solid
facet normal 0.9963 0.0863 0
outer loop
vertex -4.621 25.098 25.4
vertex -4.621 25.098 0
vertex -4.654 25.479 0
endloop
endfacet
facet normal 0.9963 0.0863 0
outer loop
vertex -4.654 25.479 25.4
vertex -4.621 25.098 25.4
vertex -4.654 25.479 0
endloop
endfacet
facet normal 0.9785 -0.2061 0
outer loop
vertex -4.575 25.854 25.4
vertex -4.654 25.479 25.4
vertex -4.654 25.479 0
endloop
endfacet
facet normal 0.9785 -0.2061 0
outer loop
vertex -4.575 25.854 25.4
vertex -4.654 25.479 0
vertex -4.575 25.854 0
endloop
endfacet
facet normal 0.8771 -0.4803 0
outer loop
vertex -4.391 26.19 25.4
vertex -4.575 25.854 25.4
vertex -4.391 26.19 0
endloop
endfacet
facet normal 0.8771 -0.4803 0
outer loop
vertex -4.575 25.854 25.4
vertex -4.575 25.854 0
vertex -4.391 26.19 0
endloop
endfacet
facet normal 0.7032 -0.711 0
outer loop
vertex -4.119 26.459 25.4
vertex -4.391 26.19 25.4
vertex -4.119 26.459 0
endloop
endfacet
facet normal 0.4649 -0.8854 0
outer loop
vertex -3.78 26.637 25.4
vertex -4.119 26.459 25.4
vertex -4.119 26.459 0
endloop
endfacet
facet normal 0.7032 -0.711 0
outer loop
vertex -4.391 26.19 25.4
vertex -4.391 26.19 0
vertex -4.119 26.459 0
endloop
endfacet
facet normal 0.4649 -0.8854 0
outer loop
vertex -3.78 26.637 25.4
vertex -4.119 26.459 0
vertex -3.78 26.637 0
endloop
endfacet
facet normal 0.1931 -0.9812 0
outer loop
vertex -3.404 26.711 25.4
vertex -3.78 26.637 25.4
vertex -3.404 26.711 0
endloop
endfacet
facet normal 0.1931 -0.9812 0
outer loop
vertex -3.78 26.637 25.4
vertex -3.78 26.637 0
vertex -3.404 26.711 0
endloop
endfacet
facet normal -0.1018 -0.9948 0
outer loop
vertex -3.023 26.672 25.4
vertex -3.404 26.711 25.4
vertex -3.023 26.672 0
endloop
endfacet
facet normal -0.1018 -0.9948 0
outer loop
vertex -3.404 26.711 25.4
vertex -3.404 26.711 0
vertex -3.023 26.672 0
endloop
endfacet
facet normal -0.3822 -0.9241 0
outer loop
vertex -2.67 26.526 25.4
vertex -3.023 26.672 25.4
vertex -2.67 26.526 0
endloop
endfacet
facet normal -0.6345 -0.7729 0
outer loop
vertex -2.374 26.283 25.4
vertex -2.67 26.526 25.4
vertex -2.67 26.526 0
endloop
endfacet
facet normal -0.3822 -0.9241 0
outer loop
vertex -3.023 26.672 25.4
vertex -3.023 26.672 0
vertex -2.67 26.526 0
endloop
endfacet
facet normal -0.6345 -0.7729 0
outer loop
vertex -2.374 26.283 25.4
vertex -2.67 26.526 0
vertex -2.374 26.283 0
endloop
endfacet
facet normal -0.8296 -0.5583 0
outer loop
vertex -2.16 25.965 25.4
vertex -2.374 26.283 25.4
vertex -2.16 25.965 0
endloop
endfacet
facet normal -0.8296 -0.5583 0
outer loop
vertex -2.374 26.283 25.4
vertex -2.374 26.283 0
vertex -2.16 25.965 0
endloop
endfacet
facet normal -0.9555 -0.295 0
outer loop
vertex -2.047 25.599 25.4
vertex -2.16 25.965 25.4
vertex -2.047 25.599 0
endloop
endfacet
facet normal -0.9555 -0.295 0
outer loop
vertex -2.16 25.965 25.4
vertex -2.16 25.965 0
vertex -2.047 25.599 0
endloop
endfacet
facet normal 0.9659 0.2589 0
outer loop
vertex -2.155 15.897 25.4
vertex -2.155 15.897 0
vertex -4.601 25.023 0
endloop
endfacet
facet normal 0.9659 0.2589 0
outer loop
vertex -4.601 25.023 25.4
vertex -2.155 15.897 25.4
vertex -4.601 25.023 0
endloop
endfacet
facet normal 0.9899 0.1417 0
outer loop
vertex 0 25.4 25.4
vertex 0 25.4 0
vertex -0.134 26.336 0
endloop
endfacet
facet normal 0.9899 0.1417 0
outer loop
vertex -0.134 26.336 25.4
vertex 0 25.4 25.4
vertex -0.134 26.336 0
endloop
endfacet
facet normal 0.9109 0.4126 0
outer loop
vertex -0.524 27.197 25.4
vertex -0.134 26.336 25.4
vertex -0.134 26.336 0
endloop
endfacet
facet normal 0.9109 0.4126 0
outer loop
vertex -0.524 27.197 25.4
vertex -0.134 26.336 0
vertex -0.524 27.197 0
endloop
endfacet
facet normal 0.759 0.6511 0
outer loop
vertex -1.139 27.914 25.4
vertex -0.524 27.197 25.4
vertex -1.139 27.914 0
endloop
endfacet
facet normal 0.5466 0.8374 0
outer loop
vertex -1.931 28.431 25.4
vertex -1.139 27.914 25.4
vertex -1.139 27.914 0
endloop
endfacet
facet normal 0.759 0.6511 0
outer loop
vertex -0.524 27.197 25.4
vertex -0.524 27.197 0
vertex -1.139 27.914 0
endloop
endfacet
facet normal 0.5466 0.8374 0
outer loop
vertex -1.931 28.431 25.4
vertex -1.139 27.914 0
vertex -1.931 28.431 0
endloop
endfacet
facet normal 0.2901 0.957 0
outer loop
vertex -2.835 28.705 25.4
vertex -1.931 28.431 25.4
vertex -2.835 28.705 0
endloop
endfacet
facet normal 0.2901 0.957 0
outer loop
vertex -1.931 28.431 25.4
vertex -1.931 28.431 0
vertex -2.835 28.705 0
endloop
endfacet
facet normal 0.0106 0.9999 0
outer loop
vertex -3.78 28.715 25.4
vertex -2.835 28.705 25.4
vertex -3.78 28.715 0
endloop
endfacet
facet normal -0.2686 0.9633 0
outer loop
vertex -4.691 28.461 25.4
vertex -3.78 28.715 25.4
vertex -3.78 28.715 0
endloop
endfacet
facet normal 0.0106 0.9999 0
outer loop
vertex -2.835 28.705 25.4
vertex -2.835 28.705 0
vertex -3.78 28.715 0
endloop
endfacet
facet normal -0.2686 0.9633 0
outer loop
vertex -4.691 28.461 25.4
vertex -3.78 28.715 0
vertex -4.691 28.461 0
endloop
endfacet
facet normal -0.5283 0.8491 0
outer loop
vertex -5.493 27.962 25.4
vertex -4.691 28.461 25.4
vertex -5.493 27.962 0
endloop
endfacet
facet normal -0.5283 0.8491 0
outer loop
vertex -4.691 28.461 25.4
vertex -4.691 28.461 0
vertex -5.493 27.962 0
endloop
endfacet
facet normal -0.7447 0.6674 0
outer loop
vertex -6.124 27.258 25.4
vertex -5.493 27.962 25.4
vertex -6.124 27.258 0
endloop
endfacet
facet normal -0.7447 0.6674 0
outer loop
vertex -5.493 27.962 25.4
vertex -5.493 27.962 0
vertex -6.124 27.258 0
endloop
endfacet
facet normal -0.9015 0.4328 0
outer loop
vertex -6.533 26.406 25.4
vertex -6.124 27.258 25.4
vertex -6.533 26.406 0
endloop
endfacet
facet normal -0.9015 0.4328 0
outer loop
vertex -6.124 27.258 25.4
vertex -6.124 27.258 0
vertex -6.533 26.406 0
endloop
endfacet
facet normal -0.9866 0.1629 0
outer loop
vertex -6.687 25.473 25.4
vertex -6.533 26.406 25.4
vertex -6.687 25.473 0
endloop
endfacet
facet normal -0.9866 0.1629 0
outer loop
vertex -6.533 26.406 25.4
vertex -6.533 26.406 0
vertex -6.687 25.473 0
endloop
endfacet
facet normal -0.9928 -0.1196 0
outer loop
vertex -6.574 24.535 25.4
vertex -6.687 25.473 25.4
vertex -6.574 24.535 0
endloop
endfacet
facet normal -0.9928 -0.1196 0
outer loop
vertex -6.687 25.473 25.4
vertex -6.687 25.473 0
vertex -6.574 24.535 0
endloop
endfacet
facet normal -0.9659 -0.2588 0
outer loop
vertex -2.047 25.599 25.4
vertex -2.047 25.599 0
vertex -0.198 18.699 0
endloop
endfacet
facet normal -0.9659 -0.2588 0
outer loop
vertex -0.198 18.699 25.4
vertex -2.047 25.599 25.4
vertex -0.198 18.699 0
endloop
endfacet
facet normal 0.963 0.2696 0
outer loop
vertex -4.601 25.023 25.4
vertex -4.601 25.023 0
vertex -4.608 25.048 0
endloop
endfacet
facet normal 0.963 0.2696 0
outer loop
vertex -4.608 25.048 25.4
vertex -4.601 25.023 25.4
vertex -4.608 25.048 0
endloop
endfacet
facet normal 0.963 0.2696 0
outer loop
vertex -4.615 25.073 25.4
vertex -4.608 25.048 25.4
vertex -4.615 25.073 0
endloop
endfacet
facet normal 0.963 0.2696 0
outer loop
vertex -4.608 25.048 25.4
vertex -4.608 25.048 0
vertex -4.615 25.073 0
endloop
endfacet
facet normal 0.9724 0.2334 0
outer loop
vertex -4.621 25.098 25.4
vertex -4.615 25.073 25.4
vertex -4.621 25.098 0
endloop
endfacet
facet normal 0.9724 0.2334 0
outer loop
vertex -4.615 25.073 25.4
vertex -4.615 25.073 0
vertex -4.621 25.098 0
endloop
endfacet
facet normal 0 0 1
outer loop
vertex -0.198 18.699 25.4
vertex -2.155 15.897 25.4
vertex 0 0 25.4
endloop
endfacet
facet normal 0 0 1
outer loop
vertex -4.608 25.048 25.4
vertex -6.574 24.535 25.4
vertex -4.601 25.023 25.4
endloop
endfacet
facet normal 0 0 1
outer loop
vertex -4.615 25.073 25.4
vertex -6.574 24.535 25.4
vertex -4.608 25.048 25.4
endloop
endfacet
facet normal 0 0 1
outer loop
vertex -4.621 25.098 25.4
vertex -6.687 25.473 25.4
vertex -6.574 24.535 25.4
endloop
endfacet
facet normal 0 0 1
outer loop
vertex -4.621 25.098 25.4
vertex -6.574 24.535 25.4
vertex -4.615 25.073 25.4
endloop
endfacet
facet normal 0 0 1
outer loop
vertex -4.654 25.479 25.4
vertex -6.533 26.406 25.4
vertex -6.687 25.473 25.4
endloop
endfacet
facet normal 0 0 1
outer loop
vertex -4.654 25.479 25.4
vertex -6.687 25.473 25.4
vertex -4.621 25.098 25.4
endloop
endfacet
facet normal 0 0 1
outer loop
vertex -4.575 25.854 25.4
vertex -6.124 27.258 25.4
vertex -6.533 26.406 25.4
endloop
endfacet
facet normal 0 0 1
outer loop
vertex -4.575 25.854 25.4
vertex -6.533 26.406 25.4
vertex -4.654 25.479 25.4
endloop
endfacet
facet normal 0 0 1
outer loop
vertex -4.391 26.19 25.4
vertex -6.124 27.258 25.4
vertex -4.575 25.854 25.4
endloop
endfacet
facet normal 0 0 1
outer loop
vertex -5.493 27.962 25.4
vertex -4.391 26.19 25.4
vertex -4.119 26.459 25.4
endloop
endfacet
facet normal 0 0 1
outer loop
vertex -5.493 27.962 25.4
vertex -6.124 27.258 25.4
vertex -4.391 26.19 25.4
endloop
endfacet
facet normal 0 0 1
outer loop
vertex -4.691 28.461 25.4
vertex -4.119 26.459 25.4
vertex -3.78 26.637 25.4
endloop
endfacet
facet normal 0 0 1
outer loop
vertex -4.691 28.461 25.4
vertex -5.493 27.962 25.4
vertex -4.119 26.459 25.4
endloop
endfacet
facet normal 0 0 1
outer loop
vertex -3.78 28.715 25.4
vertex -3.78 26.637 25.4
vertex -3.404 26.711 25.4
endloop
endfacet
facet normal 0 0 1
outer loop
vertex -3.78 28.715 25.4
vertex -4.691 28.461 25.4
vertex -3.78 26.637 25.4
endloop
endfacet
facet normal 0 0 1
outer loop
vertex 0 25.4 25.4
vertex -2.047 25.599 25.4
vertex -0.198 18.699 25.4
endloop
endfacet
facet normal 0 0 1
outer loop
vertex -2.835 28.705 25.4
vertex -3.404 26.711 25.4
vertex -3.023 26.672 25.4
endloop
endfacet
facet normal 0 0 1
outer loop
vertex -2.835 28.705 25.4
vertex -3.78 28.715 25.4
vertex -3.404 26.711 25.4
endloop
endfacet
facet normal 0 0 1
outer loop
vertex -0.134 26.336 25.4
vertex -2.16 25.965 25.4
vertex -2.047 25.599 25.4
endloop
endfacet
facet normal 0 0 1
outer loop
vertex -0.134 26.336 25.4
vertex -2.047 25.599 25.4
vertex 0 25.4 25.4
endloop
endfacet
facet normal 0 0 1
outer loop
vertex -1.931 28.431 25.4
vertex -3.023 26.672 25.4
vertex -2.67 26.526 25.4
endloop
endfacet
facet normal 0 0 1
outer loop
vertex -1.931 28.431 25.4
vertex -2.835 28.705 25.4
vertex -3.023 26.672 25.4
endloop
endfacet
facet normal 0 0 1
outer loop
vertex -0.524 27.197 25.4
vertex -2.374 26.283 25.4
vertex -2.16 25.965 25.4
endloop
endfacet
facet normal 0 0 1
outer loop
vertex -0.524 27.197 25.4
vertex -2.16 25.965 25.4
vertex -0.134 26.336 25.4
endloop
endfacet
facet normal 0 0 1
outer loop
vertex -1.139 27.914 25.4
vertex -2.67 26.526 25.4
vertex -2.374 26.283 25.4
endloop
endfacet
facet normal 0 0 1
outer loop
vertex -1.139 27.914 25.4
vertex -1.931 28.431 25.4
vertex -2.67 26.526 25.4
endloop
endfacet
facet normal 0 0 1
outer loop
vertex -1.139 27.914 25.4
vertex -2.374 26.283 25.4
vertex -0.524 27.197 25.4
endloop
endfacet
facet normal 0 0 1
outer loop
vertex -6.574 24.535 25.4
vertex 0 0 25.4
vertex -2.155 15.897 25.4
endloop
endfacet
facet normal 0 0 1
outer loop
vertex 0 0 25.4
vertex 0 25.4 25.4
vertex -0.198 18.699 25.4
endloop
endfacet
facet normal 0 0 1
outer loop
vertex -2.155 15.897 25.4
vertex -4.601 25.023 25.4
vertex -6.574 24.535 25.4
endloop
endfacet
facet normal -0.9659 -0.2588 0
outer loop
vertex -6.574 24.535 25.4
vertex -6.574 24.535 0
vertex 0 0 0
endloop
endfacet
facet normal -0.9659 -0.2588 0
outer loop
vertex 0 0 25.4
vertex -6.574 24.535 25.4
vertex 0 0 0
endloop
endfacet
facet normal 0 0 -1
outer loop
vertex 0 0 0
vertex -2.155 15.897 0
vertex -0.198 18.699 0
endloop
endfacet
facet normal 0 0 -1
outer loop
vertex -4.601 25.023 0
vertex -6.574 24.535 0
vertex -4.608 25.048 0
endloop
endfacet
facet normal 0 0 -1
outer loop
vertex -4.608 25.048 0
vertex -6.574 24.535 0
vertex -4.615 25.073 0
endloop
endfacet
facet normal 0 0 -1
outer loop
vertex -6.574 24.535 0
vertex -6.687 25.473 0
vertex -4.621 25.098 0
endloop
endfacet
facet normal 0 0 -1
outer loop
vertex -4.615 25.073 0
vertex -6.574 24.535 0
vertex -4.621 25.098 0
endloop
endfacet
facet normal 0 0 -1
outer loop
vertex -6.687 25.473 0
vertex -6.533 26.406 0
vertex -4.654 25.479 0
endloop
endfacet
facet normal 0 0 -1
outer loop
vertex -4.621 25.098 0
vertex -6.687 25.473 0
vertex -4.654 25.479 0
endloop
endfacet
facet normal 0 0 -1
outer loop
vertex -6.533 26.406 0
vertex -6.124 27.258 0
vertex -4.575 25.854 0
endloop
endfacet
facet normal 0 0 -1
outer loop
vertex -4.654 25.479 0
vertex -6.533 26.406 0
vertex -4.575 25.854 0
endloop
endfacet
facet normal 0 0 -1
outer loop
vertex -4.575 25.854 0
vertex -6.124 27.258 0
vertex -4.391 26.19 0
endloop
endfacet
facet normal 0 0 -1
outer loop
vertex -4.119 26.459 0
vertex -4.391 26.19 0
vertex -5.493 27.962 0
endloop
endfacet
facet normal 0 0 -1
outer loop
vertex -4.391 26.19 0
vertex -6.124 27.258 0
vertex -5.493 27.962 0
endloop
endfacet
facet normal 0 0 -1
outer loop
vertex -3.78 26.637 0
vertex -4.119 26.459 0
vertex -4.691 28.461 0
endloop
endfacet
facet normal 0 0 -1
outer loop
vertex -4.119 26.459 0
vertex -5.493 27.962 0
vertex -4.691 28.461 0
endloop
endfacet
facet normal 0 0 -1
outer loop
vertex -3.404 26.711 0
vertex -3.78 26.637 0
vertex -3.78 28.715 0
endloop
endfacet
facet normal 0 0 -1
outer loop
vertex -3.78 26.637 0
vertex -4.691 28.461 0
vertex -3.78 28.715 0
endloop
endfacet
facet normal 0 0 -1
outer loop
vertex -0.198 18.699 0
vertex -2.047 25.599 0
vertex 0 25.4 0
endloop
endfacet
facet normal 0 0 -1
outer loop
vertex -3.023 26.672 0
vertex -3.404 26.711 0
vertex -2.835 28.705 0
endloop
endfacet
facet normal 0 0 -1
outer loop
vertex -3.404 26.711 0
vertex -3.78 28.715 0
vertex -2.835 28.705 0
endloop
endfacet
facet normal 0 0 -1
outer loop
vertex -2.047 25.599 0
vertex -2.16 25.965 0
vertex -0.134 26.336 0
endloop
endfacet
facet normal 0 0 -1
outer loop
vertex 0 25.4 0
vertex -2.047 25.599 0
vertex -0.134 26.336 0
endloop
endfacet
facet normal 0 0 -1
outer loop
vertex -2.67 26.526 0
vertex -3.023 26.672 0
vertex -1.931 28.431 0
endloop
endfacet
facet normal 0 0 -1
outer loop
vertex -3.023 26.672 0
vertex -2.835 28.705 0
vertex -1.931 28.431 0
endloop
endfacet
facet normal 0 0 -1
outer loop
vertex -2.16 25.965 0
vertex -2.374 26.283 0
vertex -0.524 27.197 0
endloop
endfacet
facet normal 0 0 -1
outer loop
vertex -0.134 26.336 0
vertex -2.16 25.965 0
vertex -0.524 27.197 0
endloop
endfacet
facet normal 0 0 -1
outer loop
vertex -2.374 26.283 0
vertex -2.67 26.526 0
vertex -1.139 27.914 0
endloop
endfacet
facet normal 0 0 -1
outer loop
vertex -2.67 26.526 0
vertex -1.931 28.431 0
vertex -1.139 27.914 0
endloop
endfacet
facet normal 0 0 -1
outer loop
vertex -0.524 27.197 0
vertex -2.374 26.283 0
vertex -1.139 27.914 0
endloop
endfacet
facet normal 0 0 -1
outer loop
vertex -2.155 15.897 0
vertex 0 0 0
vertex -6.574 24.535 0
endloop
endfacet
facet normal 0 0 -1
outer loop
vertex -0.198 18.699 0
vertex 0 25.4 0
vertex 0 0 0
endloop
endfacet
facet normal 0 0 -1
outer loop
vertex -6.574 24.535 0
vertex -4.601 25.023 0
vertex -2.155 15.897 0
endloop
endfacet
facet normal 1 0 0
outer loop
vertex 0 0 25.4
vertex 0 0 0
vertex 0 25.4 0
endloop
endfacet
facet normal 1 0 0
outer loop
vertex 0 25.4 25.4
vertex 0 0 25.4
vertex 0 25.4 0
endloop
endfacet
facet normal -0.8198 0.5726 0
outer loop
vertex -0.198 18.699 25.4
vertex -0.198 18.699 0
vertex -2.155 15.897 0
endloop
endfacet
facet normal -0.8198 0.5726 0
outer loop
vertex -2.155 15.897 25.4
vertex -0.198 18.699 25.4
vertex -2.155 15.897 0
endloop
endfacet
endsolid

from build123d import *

# Parameters (mm, degrees)
F1_DEPTH = 25.4


with BuildPart() as f1:
    # F0 (on Top) → F1 (new body)
    with BuildSketch(Plane.XY):
        with BuildLine():
            Line((-6.574004, 24.534516), (0, 0))
            Line((0, 0), (0, 25.4))
            ThreePointArc((0, 25.4), (-3.78045, 28.715365), (-6.574004, 24.534516))
        make_face()
        with BuildLine():
            ThreePointArc((-4.620697, 25.097922), (-3.594908, 26.687752), (-2.04724, 25.599392))
            Line((-2.04724, 25.599392), (-0.198302, 18.69906))
            Line((-0.198302, 18.69906), (-2.155446, 15.897478))
            Line((-2.155446, 15.897478), (-4.600688, 25.023246))
            ThreePointArc((-4.600688, 25.023246), (-4.611242, 25.060436), (-4.620697, 25.097922))
        make_face(mode=Mode.SUBTRACT)
    extrude(amount=F1_DEPTH)


solid = f1.part
